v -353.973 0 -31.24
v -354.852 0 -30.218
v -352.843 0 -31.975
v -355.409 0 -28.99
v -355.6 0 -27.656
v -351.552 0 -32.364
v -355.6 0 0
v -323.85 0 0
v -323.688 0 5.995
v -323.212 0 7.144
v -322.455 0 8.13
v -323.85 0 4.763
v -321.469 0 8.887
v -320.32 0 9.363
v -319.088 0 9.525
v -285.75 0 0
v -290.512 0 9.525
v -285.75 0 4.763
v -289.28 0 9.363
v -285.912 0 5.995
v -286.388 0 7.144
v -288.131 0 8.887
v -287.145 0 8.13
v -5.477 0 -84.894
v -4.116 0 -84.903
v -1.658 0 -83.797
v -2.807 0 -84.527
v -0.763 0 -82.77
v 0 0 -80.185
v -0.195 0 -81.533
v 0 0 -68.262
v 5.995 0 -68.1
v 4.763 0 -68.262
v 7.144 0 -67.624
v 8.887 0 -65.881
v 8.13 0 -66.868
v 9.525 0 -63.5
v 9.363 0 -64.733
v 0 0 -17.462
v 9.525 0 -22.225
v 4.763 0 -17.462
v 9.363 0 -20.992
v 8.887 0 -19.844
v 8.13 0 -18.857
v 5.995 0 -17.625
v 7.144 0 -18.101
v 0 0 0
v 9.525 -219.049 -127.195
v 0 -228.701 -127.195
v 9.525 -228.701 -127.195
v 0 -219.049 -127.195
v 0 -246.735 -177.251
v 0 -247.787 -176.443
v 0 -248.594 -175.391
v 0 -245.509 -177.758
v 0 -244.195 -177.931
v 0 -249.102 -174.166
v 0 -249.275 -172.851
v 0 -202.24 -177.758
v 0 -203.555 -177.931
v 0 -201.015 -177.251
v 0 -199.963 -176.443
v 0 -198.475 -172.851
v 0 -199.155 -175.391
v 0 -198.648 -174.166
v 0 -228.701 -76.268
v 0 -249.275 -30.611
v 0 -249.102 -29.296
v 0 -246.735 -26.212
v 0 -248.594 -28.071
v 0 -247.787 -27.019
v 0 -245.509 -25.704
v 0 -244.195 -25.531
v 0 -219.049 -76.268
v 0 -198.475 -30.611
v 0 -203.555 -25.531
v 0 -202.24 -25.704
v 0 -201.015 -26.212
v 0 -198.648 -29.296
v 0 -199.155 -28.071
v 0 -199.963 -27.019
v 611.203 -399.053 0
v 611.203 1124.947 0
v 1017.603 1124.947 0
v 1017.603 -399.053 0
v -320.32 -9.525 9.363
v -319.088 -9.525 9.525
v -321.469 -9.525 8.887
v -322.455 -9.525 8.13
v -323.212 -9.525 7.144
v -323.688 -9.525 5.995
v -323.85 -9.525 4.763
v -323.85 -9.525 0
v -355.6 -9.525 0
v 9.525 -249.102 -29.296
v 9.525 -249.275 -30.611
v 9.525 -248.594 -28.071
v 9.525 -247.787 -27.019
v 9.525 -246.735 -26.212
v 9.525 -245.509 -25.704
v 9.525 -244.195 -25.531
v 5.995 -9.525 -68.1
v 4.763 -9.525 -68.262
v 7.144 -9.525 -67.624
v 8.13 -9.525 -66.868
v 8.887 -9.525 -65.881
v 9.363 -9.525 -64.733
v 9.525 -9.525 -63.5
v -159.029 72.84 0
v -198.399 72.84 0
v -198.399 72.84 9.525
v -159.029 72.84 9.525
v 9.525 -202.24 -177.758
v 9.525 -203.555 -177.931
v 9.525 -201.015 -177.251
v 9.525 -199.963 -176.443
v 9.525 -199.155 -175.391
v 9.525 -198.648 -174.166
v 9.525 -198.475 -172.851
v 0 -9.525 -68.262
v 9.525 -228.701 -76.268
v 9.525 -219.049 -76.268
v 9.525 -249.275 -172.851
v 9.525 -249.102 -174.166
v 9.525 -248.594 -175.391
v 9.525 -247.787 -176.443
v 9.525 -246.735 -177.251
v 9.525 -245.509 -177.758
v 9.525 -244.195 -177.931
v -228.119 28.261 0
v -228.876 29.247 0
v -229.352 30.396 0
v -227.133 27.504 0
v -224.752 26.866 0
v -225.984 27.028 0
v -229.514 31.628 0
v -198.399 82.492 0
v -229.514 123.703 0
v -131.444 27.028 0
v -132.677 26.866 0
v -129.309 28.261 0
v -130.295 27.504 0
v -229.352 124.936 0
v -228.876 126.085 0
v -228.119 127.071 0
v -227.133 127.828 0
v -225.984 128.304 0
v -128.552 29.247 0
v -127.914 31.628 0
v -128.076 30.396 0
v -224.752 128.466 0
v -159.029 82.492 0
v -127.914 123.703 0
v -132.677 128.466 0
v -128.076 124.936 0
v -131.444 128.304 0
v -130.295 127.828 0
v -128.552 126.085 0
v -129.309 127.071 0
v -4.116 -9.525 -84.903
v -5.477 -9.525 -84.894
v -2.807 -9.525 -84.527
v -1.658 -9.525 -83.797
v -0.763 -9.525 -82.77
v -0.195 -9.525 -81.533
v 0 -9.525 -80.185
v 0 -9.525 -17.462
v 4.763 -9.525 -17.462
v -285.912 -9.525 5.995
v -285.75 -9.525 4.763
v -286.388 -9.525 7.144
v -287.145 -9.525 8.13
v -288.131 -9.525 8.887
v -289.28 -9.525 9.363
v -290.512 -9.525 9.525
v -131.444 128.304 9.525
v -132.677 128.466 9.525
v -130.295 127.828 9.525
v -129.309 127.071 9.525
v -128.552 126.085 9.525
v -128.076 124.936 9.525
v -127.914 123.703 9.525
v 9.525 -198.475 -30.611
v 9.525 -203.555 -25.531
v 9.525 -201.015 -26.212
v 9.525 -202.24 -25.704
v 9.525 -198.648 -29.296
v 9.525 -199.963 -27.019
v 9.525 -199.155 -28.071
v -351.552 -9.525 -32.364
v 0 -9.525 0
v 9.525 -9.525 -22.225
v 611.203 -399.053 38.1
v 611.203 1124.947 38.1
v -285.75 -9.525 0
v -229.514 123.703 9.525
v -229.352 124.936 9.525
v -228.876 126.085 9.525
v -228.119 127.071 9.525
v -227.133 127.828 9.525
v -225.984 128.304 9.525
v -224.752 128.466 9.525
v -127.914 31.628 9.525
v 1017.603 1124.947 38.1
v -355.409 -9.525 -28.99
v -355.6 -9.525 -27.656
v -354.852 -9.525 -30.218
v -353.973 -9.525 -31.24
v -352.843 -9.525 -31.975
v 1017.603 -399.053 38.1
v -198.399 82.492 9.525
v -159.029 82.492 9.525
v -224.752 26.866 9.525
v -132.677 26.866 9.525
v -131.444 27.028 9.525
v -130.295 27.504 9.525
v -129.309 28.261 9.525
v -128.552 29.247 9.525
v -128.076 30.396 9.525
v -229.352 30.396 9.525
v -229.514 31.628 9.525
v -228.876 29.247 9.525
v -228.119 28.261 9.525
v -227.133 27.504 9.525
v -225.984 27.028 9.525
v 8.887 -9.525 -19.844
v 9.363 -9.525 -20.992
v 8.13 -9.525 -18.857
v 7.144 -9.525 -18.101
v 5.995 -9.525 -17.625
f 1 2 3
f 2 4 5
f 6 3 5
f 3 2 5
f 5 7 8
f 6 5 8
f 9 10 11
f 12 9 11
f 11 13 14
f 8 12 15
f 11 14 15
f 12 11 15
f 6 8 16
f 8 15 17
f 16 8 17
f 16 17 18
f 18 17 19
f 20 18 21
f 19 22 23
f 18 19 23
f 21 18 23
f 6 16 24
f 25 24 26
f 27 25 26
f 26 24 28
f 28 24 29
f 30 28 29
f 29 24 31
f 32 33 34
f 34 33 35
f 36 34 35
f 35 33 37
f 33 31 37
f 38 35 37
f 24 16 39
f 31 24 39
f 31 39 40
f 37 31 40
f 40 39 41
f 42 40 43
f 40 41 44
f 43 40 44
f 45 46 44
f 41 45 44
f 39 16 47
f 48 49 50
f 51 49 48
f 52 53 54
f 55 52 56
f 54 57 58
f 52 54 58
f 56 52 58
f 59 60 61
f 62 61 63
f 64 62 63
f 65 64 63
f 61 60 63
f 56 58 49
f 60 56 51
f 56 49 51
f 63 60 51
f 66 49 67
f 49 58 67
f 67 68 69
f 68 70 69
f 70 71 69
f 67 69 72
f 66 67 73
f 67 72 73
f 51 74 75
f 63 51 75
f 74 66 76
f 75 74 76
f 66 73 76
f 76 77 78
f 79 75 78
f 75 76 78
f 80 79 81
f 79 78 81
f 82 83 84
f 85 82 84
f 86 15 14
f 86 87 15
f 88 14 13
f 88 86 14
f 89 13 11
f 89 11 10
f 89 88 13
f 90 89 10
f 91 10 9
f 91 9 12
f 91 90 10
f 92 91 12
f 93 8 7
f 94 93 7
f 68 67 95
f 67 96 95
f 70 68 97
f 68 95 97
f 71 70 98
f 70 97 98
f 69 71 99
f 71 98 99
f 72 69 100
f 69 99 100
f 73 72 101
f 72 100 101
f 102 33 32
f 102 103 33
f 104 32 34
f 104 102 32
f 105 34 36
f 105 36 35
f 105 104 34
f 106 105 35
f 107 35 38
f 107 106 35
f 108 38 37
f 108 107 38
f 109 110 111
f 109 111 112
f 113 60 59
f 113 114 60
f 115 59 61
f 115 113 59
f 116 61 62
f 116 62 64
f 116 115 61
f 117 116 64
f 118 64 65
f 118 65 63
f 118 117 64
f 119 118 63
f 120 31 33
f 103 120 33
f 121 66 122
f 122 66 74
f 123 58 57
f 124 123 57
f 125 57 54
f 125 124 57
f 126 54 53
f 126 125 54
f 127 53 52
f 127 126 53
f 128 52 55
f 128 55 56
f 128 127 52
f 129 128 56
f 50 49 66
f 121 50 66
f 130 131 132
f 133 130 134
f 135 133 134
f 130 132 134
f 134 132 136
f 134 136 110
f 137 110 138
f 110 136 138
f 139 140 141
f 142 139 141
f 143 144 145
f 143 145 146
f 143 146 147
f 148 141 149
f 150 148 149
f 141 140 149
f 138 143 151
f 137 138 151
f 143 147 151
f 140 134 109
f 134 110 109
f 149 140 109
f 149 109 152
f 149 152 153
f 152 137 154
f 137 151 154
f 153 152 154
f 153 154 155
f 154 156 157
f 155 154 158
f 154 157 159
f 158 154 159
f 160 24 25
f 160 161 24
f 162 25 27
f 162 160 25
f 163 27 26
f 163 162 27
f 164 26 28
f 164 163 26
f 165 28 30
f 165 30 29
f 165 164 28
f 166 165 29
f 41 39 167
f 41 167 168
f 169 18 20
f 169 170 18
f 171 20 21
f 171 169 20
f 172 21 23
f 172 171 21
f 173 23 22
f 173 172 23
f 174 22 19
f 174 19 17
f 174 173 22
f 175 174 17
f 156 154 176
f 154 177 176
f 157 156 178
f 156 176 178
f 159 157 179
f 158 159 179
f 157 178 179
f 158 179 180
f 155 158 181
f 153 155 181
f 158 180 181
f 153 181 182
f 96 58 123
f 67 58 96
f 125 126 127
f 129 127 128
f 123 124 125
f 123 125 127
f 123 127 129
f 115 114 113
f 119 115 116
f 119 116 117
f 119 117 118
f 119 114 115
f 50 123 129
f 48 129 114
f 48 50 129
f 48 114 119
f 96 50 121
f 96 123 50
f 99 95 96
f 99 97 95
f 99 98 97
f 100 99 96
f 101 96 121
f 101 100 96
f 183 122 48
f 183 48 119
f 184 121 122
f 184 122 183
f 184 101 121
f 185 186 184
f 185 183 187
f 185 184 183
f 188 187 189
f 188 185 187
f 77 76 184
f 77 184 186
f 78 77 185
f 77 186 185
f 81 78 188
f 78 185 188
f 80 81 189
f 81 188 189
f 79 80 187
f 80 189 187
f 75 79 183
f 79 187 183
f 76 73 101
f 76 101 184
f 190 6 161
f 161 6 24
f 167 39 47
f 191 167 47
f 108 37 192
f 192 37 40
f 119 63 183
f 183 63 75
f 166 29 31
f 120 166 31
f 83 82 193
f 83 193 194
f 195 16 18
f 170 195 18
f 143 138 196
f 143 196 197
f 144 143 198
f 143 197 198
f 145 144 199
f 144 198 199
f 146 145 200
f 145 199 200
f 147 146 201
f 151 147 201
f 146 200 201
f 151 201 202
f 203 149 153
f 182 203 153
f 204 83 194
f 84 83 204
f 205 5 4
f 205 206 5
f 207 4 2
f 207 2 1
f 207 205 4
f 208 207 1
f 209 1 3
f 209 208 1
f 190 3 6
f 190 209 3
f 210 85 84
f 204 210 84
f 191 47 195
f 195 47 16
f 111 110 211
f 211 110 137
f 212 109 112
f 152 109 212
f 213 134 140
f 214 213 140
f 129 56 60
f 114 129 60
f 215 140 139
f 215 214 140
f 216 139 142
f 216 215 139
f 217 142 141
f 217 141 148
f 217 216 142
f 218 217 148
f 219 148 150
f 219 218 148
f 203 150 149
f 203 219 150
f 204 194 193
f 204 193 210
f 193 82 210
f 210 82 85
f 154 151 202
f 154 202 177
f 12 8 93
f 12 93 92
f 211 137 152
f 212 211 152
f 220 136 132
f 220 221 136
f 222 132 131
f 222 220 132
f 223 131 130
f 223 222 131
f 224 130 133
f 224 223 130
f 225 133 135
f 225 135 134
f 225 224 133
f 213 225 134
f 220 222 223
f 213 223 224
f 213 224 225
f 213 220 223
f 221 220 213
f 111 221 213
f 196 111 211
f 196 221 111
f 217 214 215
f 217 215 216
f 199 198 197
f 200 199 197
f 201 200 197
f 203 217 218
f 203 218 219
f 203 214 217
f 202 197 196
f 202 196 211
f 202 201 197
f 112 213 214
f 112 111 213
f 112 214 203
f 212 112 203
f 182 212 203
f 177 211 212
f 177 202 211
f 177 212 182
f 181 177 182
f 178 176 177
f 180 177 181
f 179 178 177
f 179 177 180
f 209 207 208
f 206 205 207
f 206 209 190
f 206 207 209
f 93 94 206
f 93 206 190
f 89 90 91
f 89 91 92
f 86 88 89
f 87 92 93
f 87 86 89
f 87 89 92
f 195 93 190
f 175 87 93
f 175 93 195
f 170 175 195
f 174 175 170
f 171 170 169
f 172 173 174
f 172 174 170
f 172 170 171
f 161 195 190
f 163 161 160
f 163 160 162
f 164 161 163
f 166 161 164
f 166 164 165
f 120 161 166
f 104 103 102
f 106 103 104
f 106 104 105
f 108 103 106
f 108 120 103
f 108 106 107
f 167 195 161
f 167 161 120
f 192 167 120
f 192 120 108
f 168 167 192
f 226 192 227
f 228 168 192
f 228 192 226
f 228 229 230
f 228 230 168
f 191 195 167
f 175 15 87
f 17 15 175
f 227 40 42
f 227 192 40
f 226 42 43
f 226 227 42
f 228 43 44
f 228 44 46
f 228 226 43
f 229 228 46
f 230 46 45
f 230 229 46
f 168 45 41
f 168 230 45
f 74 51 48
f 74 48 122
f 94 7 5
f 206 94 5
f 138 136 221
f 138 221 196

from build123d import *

# Parameters (mm, degrees)
F0_W     = 38.1
F0_H     = 9.525
F0_W_2   = 9.525
F0_H_2   = 50.8
F1_DEPTH = 9.525
F2_R     = 4.7625
F3_W     = 101.6
F3_H     = 101.6
F3_W_2   = 39.37
F3_H_2   = 9.652
F4_DEPTH = 9.525
F5_R     = 4.7625
F6_W     = 406.4
F6_H     = 1524
F7_DEPTH = 38.1
F8_W     = 50.8
F8_H     = 152.4
F8_W_2   = 9.652
F8_H_2   = 50.927
F9_DEPTH = 9.525
F10_R    = 5.08


with BuildPart() as f1:
    # F0 (on Front) → F1 (new body)
    with BuildSketch(Plane.XZ):
        Polygon((0, -17.4625), (0, 0), (-285.75, 0), (-323.85, 0), (-355.6, 0), (-355.6, -31.75), (0, -85.725), (0, -68.2625), align=None)
        with Locations((-304.8, 4.7625)):
            Rectangle(F0_W, F0_H)
        with Locations((4.7625, -42.8625)):
            Rectangle(F0_W_2, F0_H_2)
    extrude(amount=F1_DEPTH)

    # F2
    f2_edges = [f1.edges().sort_by_distance(p)[0] for p in [
        (-355.6, -4.7625, -31.75),
        (-323.85, -4.7625, 9.525),
        (-285.75, -4.7625, 9.525),
        (0, -4.7625, -85.725),
        (9.525, -4.7625, -17.4625),
        (9.525, -4.7625, -68.2625),
    ]]
    fillet(f2_edges, radius=F2_R)


with BuildPart() as f4:
    # F3 (on Top) → F4 (new body)
    with BuildSketch(Plane.XY):
        with Locations((-178.714195, 77.665811)):
            Rectangle(F3_W, F3_H)
        with Locations((-178.714195, 77.665811)):
            Rectangle(F3_W_2, F3_H_2, mode=Mode.SUBTRACT)
    extrude(amount=F4_DEPTH)

    # F5
    f5_edges = [f4.edges().sort_by_distance(p)[0] for p in [
        (-229.514195, 26.865811, 4.7625),
        (-229.514195, 128.465811, 4.7625),
        (-127.914195, 26.865811, 4.7625),
        (-127.914195, 128.465811, 4.7625),
    ]]
    fillet(f5_edges, radius=F5_R)


with BuildPart() as f7:
    # F6 (on Top) → F7 (new body)
    with BuildSketch(Plane.XY):
        with Locations((814.403134, 362.947022)):
            Rectangle(F6_W, F6_H)
    extrude(amount=F7_DEPTH)


with BuildPart() as f9:
    # F8 (on Right) → F9 (new body)
    with BuildSketch(Plane.YZ):
        with Locations((-223.874624, -101.731093)):
            Rectangle(F8_W, F8_H)
        with Locations((-223.874624, -101.731093)):
            Rectangle(F8_W_2, F8_H_2, mode=Mode.SUBTRACT)
    extrude(amount=F9_DEPTH)

    # F10
    f10_edges = [f9.edges().sort_by_distance(p)[0] for p in [
        (4.7625, -249.274624, -25.531093),
        (4.7625, -249.274624, -177.931093),
        (4.7625, -198.474624, -177.931093),
        (4.7625, -198.474624, -25.531093),
    ]]
    fillet(f10_edges, radius=F10_R)


solid = Compound([f1.part, f4.part, f7.part, f9.part])
